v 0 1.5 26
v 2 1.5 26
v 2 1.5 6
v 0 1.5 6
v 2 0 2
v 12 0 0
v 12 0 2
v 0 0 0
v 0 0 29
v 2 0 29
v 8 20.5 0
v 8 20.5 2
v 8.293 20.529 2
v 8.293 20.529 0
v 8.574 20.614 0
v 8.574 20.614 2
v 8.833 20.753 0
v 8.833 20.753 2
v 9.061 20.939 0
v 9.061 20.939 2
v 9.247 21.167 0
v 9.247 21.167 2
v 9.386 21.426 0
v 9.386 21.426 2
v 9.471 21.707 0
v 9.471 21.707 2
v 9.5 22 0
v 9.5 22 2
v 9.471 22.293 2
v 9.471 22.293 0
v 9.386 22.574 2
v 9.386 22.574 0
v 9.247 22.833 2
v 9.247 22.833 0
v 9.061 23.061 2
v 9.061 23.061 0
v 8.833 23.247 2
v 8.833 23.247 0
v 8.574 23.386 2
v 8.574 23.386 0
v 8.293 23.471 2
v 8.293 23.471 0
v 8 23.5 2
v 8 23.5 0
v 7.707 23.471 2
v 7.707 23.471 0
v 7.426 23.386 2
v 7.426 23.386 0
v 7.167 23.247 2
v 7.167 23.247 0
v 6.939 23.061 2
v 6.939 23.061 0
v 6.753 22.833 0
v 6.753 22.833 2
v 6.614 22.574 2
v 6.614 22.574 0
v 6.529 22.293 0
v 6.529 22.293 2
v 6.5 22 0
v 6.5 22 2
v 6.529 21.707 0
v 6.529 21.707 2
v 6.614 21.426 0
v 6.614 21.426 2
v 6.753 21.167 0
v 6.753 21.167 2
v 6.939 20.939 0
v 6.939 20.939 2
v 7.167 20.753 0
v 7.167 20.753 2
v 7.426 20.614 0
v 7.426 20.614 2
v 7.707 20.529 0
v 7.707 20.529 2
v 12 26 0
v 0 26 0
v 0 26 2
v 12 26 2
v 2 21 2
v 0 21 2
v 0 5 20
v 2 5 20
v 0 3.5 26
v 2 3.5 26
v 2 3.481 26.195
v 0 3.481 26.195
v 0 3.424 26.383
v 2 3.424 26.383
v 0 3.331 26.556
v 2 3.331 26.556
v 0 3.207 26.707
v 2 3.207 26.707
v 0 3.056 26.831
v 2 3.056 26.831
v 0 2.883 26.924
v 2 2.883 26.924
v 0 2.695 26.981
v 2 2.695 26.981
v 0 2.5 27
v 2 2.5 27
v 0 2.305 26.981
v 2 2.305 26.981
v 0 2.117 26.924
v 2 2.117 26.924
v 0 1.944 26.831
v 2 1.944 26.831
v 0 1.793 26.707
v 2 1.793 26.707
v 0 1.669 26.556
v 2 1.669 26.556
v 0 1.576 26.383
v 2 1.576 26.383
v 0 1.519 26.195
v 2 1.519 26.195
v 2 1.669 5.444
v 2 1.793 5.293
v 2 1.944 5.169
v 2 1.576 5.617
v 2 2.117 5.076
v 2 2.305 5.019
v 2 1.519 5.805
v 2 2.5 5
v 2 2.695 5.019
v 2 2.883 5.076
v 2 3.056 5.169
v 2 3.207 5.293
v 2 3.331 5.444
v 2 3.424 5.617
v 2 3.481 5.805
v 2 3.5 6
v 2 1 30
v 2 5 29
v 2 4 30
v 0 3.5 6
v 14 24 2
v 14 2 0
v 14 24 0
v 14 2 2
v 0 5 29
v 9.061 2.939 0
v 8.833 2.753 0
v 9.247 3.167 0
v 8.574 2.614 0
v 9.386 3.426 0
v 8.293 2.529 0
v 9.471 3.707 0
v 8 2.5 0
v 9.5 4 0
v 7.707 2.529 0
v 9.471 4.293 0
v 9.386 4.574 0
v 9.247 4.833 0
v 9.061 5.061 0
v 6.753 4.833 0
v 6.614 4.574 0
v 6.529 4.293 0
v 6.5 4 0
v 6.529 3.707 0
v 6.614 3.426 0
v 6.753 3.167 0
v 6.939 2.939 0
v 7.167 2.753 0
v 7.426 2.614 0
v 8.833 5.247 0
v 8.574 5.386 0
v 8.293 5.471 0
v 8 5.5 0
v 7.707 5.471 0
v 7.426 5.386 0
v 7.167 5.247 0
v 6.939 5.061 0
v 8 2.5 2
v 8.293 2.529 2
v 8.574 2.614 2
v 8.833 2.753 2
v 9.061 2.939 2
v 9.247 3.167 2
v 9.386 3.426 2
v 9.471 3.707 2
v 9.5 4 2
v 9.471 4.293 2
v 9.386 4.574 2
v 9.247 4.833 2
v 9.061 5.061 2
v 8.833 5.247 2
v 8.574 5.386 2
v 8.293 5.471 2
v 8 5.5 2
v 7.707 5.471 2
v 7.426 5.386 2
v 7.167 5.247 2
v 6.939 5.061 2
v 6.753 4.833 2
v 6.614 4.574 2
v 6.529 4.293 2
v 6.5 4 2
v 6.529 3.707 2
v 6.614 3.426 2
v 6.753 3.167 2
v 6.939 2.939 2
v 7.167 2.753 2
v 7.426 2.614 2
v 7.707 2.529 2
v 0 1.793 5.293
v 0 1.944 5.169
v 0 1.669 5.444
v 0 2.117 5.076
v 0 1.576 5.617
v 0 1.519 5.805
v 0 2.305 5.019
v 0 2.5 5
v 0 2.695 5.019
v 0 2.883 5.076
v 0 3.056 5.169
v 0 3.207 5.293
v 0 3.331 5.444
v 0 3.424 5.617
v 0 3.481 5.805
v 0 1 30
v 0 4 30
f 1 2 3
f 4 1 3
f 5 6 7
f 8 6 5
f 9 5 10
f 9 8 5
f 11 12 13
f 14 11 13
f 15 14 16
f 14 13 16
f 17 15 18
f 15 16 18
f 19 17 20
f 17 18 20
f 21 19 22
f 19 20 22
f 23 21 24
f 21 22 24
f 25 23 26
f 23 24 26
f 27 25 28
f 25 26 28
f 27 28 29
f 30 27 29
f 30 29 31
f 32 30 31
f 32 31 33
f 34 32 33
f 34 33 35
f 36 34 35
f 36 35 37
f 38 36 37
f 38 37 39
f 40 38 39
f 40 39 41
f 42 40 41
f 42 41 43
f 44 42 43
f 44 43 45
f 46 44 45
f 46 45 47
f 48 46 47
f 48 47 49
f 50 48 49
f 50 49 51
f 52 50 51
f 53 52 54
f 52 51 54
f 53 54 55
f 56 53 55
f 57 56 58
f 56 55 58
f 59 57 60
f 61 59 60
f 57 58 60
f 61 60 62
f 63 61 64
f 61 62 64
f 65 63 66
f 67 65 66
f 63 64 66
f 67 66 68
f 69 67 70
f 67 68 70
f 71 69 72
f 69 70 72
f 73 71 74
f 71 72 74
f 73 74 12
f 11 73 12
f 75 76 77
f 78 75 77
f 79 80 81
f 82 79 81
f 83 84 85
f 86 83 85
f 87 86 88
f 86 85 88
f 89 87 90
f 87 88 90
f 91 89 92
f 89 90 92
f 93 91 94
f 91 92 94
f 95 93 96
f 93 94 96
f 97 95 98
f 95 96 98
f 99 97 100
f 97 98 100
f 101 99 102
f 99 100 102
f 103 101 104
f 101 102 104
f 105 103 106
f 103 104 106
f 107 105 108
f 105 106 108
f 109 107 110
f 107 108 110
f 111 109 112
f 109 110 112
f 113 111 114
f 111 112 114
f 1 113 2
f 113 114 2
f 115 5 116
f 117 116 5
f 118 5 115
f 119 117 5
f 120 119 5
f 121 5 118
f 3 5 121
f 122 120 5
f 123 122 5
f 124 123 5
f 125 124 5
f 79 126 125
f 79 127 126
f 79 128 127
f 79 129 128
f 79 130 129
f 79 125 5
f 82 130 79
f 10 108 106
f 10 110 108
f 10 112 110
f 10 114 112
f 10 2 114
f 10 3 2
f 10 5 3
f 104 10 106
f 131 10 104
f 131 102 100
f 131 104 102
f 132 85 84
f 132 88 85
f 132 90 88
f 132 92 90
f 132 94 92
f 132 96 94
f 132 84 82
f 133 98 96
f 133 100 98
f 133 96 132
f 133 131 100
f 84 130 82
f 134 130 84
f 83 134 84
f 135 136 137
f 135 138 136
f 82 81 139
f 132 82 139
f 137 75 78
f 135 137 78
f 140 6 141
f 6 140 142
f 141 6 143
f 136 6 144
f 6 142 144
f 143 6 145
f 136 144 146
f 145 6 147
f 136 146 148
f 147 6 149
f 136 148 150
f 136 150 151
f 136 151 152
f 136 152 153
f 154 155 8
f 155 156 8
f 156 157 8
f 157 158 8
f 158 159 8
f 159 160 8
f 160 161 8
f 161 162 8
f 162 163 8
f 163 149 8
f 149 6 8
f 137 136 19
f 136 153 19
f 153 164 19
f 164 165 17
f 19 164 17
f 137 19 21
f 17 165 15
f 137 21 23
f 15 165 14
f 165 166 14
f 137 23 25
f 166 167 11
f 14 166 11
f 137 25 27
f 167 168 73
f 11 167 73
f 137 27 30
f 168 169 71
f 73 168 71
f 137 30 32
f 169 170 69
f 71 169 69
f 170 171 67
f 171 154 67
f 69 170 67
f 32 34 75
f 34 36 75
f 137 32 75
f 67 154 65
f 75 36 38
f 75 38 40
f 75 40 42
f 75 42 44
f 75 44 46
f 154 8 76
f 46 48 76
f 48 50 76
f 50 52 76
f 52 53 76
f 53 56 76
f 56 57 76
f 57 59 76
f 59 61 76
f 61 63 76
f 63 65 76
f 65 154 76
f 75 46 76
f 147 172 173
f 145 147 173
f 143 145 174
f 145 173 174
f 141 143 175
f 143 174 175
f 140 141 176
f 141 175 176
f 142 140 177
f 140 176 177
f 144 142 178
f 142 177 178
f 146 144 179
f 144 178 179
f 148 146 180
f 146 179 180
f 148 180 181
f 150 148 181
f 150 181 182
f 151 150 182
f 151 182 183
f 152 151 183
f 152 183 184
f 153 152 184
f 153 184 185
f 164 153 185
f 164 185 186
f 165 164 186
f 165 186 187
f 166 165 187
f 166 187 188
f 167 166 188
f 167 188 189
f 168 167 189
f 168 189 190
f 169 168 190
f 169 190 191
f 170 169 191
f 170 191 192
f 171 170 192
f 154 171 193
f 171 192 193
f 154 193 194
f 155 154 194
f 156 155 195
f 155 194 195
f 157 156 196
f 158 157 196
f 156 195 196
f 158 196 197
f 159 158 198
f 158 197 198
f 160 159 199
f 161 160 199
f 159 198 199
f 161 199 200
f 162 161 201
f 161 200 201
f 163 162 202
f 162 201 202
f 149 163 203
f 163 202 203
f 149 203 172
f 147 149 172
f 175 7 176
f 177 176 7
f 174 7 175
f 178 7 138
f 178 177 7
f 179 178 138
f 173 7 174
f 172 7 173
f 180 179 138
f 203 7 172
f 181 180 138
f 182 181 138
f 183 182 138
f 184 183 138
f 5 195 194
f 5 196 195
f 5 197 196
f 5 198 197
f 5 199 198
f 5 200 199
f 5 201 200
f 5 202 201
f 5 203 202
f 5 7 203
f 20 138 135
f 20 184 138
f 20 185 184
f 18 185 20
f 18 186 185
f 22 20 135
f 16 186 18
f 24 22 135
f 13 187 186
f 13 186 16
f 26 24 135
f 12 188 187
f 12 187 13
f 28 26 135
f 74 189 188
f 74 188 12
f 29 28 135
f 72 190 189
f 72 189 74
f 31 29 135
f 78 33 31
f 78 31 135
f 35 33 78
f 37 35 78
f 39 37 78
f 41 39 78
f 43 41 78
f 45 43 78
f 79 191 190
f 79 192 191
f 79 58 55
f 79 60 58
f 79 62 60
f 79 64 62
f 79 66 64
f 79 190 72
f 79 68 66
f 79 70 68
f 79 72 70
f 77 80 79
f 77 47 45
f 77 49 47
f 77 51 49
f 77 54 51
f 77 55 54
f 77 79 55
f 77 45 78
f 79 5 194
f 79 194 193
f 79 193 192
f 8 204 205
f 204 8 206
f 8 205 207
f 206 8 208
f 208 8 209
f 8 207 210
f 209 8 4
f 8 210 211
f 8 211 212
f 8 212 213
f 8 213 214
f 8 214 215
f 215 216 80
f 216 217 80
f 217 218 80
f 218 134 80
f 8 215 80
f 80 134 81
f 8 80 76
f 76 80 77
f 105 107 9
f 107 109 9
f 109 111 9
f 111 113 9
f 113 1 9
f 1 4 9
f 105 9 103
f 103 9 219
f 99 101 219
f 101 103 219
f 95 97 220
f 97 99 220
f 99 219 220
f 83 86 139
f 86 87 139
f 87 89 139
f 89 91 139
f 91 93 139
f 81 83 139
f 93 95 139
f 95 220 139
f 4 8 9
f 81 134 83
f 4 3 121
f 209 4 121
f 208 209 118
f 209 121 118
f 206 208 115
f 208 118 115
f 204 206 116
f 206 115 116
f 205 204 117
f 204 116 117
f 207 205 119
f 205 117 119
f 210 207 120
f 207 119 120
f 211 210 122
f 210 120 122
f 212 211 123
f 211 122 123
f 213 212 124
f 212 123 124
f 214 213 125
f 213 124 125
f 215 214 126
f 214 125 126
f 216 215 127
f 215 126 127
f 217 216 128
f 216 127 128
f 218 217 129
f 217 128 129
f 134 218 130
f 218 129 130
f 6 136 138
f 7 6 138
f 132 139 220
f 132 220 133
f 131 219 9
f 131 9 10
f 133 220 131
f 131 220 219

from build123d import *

# Parameters (mm, degrees)
PAD_DEPTH       = 2
SKETCH001_W     = 26
SKETCH001_H     = 2
PAD001_DEPTH    = 12
POCKET_DEPTH    = 5
SKETCH003_R     = 1.5
POCKET001_DEPTH = 5
CHAMFER_SIZE    = 2
CHAMFER001_SIZE = 1


with BuildPart() as part:
    # Sketch → Pad (new body)
    with BuildSketch(Plane.YZ):
        Polygon((0, 30), (0, 0), (26, 0), (26, 2), (21, 2), (5, 20), (5, 30), align=None)
    extrude(amount=PAD_DEPTH)

    # Sketch001 (on Face9 of Pad) → Pad001 (join)
    with BuildSketch(Plane.YZ.offset(2)):
        with Locations((13, 1)):
            Rectangle(SKETCH001_W, SKETCH001_H)
    extrude(amount=PAD001_DEPTH)

    # Sketch002 (on Face5 of Pad001) → Pocket (cut)
    with BuildSketch(Plane.YZ.offset(2)):
        with BuildLine():
            ThreePointArc((3.5, 26), (2.5, 27), (1.5, 26))
            Line((1.5, 26), (1.5, 6))
            ThreePointArc((1.5, 6), (2.5, 5), (3.5, 6))
            Line((3.5, 6), (3.5, 26))
        make_face()
    extrude(amount=-POCKET_DEPTH, mode=Mode.SUBTRACT)

    # Sketch003 (on Face16 of Pocket) → Pocket001 (cut)
    with BuildSketch(Plane(origin=(0, 0, 2), x_dir=(0, -1, 0), z_dir=(0, 0, 1))):
        with Locations((-22, 8)):
            Circle(SKETCH003_R)
        with Locations((-4, 8)):
            Circle(SKETCH003_R)
    extrude(amount=-POCKET001_DEPTH, mode=Mode.SUBTRACT)

    # Chamfer
    chamfer_edges = [part.edges().sort_by_distance(p)[0] for p in [
        (14, 0, 1),
        (14, 26, 1),
    ]]
    chamfer(chamfer_edges, length=CHAMFER_SIZE)

    # Chamfer001
    chamfer001_edges = [part.edges().sort_by_distance(p)[0] for p in [
        (1, 0, 30),
        (1, 5, 30),
    ]]
    chamfer(chamfer001_edges, length=CHAMFER001_SIZE)


solid = part.part
